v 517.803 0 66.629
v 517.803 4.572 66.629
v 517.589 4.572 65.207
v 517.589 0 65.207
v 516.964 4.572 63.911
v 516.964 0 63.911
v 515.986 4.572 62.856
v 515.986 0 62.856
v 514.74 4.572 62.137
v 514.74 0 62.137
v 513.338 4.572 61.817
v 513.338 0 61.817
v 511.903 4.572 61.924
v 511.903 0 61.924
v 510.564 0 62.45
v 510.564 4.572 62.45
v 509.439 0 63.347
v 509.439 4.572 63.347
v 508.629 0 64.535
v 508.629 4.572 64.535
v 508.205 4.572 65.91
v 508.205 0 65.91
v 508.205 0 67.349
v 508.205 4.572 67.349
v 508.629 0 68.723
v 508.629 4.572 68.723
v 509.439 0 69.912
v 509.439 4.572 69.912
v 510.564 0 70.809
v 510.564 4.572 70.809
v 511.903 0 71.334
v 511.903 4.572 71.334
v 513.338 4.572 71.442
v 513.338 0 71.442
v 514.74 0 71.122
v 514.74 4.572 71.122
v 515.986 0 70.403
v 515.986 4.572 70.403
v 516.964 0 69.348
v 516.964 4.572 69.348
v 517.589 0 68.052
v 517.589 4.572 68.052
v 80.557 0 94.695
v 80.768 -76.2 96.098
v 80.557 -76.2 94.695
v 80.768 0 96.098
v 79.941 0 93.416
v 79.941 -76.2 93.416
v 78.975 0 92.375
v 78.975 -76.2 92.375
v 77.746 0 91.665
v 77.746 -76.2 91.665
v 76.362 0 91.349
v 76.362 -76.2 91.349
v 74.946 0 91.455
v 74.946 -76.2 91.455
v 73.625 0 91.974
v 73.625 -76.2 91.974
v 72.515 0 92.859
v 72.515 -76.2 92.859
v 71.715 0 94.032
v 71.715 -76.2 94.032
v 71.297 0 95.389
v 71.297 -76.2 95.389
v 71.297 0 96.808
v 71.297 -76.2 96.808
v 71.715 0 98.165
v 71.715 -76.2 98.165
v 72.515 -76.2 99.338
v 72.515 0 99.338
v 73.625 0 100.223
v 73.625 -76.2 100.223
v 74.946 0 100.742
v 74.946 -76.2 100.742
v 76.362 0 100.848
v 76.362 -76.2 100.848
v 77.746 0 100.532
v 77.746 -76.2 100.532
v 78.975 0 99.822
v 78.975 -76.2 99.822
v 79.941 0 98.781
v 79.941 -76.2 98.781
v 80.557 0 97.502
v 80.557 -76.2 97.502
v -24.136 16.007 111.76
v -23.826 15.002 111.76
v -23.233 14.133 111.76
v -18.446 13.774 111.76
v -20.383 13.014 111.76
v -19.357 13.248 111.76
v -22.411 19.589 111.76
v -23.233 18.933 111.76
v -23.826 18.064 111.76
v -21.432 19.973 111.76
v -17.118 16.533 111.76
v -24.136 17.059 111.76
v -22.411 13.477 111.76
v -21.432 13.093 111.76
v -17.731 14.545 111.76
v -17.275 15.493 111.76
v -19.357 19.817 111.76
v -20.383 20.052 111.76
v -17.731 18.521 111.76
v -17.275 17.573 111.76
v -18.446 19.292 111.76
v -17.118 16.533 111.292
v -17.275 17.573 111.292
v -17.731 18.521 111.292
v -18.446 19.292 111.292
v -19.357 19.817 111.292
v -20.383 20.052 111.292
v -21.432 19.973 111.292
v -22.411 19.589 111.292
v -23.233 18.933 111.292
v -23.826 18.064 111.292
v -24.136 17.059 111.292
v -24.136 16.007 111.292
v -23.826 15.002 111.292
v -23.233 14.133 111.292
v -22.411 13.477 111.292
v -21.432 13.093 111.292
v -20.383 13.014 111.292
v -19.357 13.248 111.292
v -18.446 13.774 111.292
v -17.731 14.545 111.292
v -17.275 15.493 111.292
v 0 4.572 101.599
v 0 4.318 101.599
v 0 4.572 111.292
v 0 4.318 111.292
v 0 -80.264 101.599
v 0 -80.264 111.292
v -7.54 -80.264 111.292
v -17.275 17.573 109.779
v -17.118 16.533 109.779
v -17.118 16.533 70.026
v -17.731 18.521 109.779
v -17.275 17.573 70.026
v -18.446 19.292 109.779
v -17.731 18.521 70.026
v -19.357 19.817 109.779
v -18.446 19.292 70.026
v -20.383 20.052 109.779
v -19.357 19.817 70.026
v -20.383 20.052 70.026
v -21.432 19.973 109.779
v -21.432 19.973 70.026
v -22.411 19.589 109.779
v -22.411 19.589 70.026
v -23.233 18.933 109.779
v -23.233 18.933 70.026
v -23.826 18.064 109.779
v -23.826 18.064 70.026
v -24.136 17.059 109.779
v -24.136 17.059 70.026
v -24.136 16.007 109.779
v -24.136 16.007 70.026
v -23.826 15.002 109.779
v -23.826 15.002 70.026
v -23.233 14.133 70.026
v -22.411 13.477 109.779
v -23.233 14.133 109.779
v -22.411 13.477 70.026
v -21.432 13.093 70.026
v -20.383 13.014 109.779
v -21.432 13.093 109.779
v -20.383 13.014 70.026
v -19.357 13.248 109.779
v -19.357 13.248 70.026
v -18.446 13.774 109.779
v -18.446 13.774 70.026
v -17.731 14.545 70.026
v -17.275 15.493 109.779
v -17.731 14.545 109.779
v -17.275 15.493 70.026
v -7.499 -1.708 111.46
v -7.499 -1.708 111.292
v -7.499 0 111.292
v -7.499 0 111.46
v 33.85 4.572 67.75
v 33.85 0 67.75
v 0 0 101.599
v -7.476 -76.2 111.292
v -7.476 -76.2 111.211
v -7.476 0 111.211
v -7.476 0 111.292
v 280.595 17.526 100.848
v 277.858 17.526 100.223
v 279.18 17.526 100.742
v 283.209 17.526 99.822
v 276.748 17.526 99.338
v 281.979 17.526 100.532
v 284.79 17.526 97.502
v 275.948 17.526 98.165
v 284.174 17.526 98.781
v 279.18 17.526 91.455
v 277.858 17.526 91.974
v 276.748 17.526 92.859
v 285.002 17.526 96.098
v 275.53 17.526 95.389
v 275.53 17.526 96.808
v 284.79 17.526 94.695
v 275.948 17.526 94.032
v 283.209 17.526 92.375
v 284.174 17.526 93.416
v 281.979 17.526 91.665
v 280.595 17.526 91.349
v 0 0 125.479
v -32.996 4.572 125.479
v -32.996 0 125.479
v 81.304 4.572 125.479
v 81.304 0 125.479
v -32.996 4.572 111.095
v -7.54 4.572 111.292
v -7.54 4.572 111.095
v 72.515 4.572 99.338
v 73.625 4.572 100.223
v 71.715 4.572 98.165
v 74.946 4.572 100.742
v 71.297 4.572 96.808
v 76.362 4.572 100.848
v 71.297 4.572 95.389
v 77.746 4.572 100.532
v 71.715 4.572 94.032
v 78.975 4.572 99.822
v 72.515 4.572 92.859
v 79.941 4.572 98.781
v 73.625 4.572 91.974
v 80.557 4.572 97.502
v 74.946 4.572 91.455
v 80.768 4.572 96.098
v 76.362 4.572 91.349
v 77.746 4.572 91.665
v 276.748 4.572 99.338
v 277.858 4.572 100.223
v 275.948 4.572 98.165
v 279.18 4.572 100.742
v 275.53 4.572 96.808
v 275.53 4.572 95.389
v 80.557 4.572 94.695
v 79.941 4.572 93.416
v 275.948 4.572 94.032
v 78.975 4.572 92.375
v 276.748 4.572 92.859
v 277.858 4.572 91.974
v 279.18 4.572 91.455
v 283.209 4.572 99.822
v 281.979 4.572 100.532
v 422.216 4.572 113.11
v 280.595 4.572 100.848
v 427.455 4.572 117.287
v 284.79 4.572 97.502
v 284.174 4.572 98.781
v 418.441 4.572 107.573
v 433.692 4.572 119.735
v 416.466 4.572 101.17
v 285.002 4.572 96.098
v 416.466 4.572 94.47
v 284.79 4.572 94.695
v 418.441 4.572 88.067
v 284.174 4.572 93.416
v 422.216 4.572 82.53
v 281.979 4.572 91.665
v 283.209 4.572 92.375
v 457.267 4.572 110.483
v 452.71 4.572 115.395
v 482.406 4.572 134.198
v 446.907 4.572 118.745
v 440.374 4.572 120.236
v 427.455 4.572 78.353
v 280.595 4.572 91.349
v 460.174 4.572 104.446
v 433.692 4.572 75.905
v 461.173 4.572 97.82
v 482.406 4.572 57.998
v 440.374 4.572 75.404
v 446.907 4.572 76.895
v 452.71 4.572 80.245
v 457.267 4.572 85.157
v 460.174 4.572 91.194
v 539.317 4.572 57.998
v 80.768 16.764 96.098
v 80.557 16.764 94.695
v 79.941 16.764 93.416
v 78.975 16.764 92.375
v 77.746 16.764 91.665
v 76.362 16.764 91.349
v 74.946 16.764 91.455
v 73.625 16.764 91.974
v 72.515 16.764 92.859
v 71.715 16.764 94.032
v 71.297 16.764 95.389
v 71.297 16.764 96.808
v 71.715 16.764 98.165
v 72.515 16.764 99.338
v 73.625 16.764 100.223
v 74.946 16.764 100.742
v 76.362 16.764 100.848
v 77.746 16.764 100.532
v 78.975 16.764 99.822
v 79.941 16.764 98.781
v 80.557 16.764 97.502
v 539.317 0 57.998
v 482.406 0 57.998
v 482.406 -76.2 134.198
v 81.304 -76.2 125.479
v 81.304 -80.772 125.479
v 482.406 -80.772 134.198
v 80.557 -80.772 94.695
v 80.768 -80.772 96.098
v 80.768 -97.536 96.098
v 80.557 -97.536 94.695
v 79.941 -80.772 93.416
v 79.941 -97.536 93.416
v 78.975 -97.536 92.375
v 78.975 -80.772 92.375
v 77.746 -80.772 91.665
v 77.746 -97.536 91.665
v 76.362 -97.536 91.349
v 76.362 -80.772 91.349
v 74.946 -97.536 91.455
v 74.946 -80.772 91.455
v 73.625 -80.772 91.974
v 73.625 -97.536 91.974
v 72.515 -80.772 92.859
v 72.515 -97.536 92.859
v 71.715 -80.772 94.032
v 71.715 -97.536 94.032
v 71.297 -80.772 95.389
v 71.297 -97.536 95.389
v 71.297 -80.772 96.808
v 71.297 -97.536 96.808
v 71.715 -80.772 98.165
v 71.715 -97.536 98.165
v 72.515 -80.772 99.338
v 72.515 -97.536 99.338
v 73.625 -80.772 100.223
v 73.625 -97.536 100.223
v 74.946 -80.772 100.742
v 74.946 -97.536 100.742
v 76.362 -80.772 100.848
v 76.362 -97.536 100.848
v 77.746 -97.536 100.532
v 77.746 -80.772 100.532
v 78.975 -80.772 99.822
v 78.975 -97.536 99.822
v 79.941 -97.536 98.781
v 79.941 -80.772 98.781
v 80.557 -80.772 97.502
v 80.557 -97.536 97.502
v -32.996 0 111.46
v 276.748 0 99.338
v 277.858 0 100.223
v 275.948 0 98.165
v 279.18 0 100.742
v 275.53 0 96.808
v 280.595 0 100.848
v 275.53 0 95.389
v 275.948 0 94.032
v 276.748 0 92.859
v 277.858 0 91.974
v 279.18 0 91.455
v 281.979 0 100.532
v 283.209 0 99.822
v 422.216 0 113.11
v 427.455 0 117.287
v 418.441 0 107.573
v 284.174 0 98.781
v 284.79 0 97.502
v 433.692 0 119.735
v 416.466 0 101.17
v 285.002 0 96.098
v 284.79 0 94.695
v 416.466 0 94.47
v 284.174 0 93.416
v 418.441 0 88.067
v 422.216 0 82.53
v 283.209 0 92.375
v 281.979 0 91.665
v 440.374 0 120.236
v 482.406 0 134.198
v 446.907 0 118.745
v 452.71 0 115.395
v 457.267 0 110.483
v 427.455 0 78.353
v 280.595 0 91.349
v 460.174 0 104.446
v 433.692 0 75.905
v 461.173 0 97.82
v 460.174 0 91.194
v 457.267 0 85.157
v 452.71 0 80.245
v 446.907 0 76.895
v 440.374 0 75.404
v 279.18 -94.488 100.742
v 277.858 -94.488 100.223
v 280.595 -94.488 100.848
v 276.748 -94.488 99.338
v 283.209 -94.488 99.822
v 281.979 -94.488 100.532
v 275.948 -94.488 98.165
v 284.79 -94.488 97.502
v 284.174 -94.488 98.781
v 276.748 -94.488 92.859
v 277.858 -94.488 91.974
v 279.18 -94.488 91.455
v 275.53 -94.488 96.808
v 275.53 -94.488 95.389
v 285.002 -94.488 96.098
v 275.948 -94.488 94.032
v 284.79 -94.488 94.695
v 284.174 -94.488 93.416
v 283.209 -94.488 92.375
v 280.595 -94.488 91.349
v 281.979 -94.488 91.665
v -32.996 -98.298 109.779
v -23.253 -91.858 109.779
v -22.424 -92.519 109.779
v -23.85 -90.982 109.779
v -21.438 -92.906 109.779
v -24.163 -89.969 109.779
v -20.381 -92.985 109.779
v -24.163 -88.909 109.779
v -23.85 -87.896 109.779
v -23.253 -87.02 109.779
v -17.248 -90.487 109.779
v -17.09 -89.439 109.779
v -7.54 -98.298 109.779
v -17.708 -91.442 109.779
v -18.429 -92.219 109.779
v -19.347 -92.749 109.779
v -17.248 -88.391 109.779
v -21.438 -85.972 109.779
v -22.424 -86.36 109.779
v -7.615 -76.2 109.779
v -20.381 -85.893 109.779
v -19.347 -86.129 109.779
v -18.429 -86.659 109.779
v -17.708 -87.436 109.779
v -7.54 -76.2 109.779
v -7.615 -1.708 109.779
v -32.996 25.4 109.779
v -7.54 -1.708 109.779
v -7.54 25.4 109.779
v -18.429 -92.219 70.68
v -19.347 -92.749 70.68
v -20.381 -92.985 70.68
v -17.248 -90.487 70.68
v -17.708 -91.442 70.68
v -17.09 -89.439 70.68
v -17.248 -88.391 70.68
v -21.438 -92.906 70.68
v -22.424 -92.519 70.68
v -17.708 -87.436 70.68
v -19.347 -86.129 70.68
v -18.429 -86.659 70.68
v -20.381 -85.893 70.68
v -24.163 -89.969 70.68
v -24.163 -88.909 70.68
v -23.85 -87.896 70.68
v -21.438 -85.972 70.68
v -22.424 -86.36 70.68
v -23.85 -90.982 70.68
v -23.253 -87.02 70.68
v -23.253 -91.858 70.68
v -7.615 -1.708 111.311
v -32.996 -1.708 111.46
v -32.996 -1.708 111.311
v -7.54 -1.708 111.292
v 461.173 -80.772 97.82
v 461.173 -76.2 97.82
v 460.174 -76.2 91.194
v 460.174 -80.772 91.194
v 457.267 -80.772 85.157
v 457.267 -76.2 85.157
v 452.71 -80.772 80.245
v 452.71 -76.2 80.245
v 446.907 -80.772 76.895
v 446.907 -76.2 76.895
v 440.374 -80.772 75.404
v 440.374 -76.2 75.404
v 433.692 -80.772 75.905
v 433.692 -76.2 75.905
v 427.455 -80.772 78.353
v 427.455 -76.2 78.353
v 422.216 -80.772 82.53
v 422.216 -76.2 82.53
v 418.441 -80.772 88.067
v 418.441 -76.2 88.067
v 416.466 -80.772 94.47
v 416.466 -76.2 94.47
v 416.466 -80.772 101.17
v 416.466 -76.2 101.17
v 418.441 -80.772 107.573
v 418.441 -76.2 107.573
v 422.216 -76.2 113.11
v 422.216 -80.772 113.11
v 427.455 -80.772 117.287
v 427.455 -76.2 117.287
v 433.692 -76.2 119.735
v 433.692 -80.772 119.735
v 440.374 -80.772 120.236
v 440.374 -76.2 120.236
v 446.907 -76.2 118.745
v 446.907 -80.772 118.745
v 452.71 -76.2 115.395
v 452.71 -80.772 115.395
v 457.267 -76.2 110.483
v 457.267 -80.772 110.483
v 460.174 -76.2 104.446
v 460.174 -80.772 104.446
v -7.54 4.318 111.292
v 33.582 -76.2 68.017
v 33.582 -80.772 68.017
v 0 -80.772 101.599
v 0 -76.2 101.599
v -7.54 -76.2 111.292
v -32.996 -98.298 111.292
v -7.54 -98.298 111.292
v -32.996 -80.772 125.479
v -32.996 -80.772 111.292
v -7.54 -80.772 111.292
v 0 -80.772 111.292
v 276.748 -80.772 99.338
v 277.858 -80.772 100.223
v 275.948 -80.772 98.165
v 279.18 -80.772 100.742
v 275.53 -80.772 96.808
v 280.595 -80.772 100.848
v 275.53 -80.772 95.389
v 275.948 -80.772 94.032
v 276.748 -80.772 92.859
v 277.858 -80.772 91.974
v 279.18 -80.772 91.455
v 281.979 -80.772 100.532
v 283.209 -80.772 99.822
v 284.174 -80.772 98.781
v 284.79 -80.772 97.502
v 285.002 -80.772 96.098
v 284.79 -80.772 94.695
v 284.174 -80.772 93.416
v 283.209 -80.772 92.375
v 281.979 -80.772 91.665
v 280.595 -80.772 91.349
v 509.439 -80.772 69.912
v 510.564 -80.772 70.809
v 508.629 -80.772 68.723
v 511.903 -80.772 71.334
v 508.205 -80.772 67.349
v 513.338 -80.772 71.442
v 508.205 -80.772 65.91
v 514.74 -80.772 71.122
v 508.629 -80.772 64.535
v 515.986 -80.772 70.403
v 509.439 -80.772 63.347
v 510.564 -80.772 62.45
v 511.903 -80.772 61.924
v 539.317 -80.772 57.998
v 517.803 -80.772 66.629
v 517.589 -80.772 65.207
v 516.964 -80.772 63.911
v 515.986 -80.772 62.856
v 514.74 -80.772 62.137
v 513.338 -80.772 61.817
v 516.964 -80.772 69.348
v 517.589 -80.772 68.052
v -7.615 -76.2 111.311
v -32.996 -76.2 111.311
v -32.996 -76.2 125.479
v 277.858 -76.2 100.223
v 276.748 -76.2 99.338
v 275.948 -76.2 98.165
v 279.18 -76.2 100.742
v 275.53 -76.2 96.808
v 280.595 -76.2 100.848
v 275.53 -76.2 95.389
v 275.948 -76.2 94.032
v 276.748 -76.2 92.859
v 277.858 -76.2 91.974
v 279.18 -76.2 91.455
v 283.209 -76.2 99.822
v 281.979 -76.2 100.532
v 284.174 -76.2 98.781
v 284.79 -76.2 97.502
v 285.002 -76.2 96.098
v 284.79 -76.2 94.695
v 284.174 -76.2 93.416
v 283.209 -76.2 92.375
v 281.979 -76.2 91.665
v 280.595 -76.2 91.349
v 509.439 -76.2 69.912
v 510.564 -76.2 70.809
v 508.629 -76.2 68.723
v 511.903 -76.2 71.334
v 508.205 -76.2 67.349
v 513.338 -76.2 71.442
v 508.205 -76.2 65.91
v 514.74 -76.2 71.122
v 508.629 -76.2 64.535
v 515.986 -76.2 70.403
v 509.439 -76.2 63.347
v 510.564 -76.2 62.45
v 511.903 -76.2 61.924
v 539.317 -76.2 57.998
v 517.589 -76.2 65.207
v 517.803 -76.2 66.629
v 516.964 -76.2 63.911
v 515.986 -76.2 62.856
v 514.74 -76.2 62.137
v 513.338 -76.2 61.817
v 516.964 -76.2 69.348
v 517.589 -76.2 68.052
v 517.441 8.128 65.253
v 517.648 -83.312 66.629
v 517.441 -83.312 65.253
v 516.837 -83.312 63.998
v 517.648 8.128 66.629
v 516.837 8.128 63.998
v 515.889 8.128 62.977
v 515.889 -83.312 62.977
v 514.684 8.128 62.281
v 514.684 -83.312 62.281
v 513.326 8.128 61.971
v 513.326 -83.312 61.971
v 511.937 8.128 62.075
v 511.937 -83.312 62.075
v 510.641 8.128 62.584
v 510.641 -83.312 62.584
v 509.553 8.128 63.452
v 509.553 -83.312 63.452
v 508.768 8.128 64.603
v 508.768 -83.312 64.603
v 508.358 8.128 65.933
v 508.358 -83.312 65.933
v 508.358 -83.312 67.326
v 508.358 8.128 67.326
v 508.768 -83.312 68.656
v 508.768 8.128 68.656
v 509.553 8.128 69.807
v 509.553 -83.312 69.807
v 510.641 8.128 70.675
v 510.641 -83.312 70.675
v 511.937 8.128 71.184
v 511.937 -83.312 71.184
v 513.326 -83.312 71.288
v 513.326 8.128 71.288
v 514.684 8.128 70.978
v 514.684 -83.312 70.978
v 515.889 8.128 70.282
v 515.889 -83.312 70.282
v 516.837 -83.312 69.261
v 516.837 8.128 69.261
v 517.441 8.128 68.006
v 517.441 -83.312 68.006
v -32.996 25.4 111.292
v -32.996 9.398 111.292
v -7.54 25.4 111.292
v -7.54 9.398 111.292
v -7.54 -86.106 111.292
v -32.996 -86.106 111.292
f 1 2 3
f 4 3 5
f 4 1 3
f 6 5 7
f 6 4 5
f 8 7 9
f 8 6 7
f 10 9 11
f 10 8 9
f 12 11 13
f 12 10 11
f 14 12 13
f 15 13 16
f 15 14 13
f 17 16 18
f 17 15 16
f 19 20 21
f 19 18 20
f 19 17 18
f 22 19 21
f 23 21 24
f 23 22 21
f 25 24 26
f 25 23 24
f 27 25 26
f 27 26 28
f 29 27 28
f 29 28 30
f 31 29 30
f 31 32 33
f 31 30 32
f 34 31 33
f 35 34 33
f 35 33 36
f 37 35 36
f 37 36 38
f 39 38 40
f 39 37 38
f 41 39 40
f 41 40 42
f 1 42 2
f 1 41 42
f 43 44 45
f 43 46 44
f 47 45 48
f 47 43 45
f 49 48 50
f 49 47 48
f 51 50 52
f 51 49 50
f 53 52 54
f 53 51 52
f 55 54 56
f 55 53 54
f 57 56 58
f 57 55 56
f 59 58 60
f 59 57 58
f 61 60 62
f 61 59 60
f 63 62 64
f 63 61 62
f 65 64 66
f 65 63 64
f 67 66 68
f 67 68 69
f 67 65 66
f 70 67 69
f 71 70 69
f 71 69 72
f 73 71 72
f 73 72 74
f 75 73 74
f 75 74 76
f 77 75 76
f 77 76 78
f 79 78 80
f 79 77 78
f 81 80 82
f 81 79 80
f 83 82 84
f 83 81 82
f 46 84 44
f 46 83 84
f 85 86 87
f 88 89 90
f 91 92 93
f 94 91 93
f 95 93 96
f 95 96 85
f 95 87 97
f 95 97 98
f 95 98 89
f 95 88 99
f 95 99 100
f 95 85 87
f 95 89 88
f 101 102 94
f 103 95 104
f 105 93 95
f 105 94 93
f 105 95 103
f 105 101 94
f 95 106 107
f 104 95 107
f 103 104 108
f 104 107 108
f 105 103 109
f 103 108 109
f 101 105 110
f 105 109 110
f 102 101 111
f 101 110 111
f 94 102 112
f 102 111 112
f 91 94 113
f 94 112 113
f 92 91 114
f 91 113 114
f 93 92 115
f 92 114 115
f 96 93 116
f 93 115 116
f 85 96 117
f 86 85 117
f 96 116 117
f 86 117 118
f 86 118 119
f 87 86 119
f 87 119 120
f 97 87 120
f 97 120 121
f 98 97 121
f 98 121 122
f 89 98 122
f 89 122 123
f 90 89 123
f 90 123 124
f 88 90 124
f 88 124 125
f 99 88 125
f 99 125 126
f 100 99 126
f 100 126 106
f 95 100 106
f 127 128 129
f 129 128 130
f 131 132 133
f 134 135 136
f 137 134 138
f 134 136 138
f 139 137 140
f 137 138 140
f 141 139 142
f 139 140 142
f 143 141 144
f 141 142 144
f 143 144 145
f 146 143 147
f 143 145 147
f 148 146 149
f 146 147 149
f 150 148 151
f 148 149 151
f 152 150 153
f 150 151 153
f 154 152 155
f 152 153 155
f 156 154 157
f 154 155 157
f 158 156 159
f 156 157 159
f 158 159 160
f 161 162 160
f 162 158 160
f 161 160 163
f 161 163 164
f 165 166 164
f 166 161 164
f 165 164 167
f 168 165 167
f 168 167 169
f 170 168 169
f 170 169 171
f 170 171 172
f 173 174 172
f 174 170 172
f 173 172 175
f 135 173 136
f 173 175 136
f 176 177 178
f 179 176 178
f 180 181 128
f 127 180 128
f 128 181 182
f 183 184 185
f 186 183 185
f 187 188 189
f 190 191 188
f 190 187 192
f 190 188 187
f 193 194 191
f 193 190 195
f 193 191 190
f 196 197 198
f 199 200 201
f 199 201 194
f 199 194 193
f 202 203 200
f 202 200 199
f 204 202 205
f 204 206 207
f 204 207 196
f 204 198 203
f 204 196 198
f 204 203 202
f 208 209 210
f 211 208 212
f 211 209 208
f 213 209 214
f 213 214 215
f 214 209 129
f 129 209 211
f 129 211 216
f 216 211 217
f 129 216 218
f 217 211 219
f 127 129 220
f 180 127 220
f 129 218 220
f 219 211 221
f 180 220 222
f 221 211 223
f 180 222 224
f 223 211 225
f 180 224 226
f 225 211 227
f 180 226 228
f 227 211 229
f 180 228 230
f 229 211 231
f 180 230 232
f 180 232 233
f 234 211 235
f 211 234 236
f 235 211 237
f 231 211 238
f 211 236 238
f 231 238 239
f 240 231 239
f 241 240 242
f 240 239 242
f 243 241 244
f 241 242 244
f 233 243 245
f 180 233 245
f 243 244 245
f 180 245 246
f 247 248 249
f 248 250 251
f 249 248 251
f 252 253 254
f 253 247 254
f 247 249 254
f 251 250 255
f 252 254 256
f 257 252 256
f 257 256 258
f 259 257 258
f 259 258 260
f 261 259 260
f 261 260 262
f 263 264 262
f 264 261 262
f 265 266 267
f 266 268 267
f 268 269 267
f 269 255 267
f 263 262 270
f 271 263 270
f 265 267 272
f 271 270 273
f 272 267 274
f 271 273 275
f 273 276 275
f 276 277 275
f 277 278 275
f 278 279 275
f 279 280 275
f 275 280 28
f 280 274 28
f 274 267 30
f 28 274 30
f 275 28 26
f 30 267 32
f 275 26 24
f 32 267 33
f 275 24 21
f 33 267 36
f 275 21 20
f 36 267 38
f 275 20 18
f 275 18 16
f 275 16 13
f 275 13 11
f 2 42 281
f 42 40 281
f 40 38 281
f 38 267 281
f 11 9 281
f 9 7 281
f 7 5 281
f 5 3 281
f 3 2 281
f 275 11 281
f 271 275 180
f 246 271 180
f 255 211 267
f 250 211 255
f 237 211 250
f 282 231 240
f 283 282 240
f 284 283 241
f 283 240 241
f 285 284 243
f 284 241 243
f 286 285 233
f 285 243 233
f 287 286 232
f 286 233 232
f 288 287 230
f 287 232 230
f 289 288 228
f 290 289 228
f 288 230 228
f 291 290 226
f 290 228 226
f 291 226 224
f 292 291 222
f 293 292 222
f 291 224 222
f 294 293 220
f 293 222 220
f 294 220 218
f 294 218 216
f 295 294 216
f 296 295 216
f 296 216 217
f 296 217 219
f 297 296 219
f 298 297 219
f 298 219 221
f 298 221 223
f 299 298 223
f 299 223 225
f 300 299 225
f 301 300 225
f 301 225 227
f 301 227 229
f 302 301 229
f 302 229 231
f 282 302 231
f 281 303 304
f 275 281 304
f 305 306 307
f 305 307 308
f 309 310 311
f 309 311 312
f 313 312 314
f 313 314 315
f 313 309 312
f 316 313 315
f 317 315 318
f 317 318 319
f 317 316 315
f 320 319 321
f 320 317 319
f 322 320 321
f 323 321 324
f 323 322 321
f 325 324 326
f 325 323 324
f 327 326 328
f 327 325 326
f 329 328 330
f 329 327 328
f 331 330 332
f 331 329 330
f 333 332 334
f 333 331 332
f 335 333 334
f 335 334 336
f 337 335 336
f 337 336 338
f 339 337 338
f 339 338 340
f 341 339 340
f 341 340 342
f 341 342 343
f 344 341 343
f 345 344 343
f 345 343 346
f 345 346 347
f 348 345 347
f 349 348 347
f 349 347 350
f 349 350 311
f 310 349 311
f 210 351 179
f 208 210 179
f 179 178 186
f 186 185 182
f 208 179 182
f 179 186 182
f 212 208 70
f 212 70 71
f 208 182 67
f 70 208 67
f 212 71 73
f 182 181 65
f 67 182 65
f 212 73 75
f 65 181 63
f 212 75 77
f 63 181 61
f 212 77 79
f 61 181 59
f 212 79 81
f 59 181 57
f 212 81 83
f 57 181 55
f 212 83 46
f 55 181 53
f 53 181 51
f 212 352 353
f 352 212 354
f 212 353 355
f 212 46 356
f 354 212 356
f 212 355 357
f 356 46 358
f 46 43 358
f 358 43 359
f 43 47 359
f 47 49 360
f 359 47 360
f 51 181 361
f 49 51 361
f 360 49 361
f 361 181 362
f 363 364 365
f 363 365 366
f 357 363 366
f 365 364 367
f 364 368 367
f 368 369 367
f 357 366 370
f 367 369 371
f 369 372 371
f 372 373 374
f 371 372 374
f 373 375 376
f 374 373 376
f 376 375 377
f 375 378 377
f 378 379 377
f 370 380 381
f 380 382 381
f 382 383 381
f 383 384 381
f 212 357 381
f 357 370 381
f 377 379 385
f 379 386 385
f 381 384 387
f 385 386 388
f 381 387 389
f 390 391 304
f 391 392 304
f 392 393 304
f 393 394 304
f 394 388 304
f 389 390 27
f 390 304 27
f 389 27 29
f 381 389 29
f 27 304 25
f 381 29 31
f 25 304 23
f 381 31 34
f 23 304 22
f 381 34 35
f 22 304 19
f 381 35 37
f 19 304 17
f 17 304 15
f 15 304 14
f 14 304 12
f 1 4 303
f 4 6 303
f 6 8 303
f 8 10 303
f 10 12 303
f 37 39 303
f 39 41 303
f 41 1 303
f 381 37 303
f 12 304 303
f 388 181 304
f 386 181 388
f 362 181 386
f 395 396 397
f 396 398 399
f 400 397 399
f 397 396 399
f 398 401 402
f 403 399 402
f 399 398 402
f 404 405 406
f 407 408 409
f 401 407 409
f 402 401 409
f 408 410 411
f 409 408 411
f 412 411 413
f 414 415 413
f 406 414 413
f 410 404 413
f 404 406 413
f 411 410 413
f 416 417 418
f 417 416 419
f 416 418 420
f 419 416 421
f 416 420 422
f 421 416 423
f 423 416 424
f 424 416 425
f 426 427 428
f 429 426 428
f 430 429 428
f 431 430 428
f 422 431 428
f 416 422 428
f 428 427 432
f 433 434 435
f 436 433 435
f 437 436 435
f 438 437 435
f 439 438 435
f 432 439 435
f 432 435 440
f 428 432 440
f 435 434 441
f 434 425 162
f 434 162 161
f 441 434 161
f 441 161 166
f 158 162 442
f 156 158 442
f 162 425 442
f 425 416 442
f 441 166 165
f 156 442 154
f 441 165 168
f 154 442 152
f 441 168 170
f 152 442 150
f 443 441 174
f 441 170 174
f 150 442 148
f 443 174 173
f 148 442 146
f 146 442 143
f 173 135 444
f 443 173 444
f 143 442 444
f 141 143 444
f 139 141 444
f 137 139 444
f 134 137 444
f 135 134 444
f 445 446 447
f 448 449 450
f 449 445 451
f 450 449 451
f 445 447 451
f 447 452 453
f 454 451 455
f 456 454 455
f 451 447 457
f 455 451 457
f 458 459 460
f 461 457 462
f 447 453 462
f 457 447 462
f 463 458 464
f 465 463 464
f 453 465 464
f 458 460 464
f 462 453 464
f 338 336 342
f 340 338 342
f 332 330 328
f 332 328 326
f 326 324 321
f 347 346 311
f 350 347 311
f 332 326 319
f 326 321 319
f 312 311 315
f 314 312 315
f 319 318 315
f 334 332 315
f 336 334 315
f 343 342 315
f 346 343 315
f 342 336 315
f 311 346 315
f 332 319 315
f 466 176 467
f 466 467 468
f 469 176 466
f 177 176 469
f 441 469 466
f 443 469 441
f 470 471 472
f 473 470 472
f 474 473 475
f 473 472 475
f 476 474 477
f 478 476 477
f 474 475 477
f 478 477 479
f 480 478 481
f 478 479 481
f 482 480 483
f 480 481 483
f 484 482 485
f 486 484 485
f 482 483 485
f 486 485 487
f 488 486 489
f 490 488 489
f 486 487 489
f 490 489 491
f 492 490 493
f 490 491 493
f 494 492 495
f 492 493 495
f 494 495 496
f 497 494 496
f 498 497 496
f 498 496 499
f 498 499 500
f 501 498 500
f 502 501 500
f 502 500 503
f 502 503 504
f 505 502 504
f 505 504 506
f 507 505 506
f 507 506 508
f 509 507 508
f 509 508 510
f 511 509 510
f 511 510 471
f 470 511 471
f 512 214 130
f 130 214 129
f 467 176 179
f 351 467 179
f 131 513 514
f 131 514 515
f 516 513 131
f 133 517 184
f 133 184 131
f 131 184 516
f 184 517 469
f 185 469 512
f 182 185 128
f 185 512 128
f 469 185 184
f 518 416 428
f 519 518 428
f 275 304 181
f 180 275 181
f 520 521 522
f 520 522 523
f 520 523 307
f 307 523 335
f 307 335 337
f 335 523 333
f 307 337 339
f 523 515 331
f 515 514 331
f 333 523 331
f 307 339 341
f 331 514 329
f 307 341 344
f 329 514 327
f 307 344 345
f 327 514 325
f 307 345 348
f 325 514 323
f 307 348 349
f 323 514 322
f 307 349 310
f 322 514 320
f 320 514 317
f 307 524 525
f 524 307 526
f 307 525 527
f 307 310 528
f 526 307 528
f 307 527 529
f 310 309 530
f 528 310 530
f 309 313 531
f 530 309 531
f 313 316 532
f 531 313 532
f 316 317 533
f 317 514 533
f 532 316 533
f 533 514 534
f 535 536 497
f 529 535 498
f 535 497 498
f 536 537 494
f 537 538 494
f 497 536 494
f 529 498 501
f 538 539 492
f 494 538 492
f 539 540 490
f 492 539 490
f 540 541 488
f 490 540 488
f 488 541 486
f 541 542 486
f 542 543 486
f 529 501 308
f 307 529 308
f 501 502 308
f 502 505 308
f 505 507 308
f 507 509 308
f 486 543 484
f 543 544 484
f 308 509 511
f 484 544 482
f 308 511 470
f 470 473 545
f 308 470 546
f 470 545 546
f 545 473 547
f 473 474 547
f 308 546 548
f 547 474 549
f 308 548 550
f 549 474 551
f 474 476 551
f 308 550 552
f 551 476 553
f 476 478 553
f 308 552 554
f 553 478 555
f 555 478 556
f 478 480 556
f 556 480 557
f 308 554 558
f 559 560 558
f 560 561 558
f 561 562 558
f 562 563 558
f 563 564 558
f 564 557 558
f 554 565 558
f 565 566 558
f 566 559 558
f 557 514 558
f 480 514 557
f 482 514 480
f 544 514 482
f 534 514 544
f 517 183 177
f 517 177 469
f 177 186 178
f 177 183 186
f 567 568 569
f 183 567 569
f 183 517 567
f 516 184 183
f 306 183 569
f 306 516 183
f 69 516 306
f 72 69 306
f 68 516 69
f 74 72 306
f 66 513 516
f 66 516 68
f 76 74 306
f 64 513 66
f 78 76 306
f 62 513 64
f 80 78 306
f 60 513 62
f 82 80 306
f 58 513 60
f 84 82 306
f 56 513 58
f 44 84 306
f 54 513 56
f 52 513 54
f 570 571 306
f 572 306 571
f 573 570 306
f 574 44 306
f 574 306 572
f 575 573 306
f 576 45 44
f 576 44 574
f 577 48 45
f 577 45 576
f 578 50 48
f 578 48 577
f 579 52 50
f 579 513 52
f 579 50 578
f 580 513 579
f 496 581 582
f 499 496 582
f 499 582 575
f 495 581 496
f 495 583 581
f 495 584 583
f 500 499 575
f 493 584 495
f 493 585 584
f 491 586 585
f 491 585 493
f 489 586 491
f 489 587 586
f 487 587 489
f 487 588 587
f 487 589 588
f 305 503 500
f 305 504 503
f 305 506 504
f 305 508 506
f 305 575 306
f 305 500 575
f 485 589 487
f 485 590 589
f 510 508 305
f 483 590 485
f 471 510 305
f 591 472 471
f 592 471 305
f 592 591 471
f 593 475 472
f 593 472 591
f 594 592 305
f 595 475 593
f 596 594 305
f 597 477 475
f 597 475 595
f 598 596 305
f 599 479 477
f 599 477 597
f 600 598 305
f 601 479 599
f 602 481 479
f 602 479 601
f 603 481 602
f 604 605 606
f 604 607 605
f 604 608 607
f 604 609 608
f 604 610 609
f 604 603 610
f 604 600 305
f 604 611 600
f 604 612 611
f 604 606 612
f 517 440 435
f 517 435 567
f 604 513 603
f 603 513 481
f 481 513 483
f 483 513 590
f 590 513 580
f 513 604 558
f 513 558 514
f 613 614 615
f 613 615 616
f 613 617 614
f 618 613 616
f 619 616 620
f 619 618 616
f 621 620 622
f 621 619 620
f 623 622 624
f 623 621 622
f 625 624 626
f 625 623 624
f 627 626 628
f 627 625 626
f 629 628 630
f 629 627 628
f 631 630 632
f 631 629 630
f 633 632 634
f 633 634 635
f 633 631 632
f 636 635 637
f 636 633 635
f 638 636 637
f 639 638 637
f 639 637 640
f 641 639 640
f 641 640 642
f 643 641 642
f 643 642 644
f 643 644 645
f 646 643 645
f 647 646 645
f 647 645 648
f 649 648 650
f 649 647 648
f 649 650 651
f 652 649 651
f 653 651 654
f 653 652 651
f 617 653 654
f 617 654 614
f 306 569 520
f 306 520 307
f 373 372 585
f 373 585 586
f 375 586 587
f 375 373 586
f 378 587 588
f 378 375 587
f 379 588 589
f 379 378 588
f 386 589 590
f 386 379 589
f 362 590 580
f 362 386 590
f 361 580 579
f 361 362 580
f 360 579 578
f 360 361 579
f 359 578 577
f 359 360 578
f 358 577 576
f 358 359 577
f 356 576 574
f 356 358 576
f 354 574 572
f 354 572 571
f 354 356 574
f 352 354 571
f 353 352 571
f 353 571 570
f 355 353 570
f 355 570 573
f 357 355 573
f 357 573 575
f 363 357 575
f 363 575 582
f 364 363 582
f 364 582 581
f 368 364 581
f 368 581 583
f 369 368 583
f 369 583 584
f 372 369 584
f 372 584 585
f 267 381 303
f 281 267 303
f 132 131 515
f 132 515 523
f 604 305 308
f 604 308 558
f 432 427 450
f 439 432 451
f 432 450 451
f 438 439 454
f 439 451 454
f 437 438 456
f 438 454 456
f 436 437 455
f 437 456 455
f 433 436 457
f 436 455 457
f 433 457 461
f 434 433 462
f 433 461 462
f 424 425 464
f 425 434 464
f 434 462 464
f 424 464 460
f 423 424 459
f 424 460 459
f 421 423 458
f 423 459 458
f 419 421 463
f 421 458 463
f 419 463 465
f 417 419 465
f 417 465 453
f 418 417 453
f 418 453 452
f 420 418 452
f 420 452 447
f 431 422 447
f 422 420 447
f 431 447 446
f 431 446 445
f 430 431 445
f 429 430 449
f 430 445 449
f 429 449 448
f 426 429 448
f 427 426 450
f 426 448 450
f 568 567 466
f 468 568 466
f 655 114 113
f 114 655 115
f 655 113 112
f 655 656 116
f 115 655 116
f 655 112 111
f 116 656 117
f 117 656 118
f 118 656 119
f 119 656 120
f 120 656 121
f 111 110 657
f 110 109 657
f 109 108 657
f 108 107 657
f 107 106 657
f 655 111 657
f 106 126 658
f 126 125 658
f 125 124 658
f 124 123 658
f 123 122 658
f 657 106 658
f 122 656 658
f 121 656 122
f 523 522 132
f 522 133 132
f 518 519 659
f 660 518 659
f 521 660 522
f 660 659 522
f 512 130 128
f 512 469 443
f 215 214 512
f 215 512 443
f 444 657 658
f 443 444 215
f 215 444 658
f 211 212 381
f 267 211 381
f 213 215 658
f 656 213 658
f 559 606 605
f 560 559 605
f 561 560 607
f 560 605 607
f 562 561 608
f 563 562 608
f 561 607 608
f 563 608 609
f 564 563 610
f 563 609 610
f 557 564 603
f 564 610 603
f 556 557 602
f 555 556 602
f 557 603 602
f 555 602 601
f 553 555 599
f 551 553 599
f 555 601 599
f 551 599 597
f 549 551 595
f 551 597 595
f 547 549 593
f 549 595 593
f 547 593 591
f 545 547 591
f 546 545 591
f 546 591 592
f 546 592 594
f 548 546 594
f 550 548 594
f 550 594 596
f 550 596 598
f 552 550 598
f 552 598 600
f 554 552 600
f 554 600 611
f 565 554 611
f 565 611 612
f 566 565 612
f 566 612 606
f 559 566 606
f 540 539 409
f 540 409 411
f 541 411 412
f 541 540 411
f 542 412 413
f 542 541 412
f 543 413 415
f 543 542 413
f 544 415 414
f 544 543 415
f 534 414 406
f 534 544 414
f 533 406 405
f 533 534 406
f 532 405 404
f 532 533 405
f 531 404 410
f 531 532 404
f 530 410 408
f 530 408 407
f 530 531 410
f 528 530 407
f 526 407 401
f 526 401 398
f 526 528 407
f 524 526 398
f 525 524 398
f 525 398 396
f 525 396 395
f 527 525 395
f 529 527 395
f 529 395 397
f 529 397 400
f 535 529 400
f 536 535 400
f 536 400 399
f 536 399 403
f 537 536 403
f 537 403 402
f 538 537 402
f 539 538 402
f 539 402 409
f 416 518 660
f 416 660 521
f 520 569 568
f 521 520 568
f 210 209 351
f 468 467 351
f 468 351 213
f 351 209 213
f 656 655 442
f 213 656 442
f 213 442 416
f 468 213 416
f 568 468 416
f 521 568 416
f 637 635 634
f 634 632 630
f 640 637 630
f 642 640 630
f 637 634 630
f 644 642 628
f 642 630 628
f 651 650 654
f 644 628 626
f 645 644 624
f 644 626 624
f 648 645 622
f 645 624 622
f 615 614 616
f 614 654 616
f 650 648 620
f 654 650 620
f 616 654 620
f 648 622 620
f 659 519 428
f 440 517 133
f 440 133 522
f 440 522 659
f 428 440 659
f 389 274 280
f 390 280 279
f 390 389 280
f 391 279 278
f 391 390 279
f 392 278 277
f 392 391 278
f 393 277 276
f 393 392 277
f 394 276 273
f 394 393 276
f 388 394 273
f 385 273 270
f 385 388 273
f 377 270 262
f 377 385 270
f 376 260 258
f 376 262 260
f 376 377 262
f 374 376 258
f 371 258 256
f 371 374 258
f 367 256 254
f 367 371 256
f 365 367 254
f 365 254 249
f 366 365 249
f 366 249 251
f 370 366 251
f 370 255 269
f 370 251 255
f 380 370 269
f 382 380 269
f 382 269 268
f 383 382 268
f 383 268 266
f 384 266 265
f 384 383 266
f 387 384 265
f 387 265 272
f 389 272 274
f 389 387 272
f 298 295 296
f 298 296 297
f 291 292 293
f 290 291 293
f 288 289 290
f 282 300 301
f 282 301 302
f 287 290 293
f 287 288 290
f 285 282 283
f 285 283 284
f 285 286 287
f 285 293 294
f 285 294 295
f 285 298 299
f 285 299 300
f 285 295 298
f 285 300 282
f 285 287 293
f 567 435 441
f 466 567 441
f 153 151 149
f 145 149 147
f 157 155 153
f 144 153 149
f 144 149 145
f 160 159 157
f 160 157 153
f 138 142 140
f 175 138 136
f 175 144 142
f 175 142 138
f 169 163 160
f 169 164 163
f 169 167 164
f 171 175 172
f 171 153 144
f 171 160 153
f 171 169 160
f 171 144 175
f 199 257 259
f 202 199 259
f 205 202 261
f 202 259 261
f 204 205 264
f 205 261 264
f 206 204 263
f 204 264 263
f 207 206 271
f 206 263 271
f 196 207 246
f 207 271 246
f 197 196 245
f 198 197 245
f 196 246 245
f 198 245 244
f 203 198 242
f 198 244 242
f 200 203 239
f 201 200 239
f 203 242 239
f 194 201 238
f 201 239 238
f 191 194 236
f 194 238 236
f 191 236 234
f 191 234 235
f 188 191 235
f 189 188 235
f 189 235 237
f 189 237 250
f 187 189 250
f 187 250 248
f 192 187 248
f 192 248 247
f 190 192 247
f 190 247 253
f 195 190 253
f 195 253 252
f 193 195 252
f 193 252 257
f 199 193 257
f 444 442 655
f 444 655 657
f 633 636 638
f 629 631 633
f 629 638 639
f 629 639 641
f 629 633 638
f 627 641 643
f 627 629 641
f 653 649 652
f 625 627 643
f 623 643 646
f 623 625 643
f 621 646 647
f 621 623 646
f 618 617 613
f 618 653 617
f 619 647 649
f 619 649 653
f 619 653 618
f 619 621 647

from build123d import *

# Parameters (mm, degrees)
SALIENTE_EXTRUIR2_DEPTH       = 4.572
CROQUIS4_R                    = 4.7625
CORTAR_EXTRUIR2_DEPTH         = 152.654
CORTAR_EXTRUIR2_DEPTH_BACK    = 98.552
CROQUIS5_R                    = 7.9375
CORTAR_EXTRUIR5_DEPTH         = 47.498
CORTAR_EXTRUIR5_DEPTH_BACK    = 59.182
CROQUIS6_R                    = 4.7625
SALIENTE_EXTRUIR4_DEPTH       = 17.526
SALIENTE_EXTRUIR4_DEPTH_BACK  = 94.488
CROQUIS7_R                    = 4.7625
SALIENTE_EXTRUIR5_DEPTH       = 16.002
SALIENTE_EXTRUIR5_DEPTH_BACK  = 97.536
CROQUIS10_R                   = 7.9375
SALIENTE_EXTRUIR6_DEPTH       = 4.572
CROQUIS11_R                   = 22.479
CORTAR_EXTRUIR6_DEPTH         = 97.282
CORTAR_EXTRUIR6_DEPTH_BACK    = 123.444
CROQUIS12_R                   = 4.826
CORTAR_EXTRUIR7_DEPTH         = 113.792
CORTAR_EXTRUIR7_DEPTH_BACK    = 187.96
CROQUIS13_R                   = 4.671315892
SALIENTE_EXTRUIR8_DEPTH       = 3.556
SALIENTE_EXTRUIR8_DEPTH_BACK  = 87.884
CORTAR_EXTRUIR8_DEPTH         = 84.074
CORTAR_EXTRUIR8_DEPTH_BACK    = 142.748
CROQUIS15_W                   = 114.3
CROQUIS15_H                   = 14.18647629
SALIENTE_EXTRUIR13_DEPTH      = 9.398
SALIENTE_EXTRUIR13_DEPTH_BACK = 86.106
CROQUIS17_W                   = 25.456436791
CROQUIS17_H                   = 1.513590227
SALIENTE_EXTRUIR14_DEPTH      = 25.4
SALIENTE_EXTRUIR14_DEPTH_BACK = 98.298
CROQUIS18_W                   = 13.736168234
CROQUIS18_H                   = 76.2
CORTAR_EXTRUIR9_DEPTH         = 127.508
CROQUIS19_W                   = 14.167732796
CROQUIS19_H                   = 72.287064097
CORTAR_EXTRUIR12_DEPTH        = 127.508
CROQUIS20_W                   = 71.243454513
CROQUIS20_H                   = 66.240283729
CORTAR_EXTRUIR13_DEPTH        = 289.306
CORTAR_EXTRUIR13_DEPTH_BACK   = 150.368
CORTAR_EXTRUIR14_DEPTH        = 662.432
CORTAR_EXTRUIR14_DEPTH_BACK   = 12.7
CORTAR_EXTRUIR15_DEPTH        = 397.51
CROQUIS23_R                   = 4.7625
SALIENTE_EXTRUIR15_DEPTH      = 16.764
SALIENTE_EXTRUIR15_DEPTH_BACK = 95.504
CORTAR_EXTRUIR17_DEPTH        = 83.566
CORTAR_EXTRUIR17_DEPTH_BACK   = 37.846
CROQUIS25_W                   = 14.18647629
CROQUIS25_H                   = 5.334
CORTAR_EXTRUIR18_DEPTH        = 88.138
CORTAR_EXTRUIR18_DEPTH_BACK   = 41.402
CROQUIS26_W                   = 14.019306629
CROQUIS26_H                   = 1.708052777
CORTAR_EXTRUIR19_DEPTH        = 41.402
CORTAR_EXTRUIR19_DEPTH_BACK   = 67.31
CROQUIS27_W                   = 14.167732796
CROQUIS27_H                   = 2.204883126
CORTAR_EXTRUIR20_DEPTH        = 48.26
CORTAR_EXTRUIR20_DEPTH_BACK   = 71.628
CROQUIS28_W                   = 7.614539368
CROQUIS28_H                   = 74.491947223
CORTAR_EXTRUIR21_DEPTH        = 254
CROQUIS29_W                   = 7.498830198
CROQUIS29_H                   = 1.708052777
CORTAR_EXTRUIR22_DEPTH        = 340.106
SALIENTE_EXTRUIR19_DEPTH      = 4.318
SALIENTE_EXTRUIR19_DEPTH_BACK = 80.264
CROQUIS32_W                   = 7.476401903
CROQUIS32_H                   = 76.2
CORTAR_EXTRUIR24_DEPTH        = 209.042
CROQUIS33_R                   = 3.528685289
SALIENTE_EXTRUIR20_DEPTH      = 111.76
CROQUIS34_W                   = 7.057370577
CROQUIS34_H                   = 70.026056614
CORTAR_EXTRUIR25_DEPTH        = 200.406
CROQUIS35_R                   = 3.556
SALIENTE_EXTRUIR21_DEPTH      = 110.998
SALIENTE_EXTRUIR21_DEPTH_BACK = 5.08
CROQUIS36_W                   = 75.760333747
CROQUIS36_H                   = 7.112
CORTAR_EXTRUIR26_DEPTH        = 55.626
CORTAR_EXTRUIR26_DEPTH_BACK   = 67.818


with BuildPart() as part:
    # Croquis1 → Saliente-Extruir2 (new body)
    with BuildSketch(Plane(origin=(0, 0, 0), x_dir=(1, 0, 0), z_dir=(0, 1, 0))):
        Polygon((-101.794045487, -70.698494166), (-101.794045487, -121.498494166), (482.405954513, -134.198494166), (539.316670094, -57.998494166), (482.405954513, -57.998494166), align=None)
    extrude(amount=SALIENTE_EXTRUIR2_DEPTH)

    # Croquis4 → Cortar-Extruir2 (cut, two sides)
    with BuildSketch(Plane(origin=(0, 0, 0), x_dir=(1, 0, 0), z_dir=(0, 1, 0))) as cortar_extruir2_sk:
        with Locations((76.005954513, -96.098494166)):
            Circle(CROQUIS4_R)
        with Locations((280.239325042, -96.098494166)):
            Circle(CROQUIS4_R)
    extrude(amount=CORTAR_EXTRUIR2_DEPTH, mode=Mode.SUBTRACT)
    extrude(cortar_extruir2_sk.sketch, amount=-CORTAR_EXTRUIR2_DEPTH_BACK, mode=Mode.SUBTRACT)

    # Croquis5 → Cortar-Extruir5 (cut, two sides)
    with BuildSketch(Plane(origin=(0, 0, 0), x_dir=(1, 0, 0), z_dir=(0, 1, 0))) as cortar_extruir5_sk:
        with Locations((438.694154646, -97.820081973)):
            Circle(CROQUIS5_R)
    extrude(amount=CORTAR_EXTRUIR5_DEPTH, mode=Mode.SUBTRACT)
    extrude(cortar_extruir5_sk.sketch, amount=-CORTAR_EXTRUIR5_DEPTH_BACK, mode=Mode.SUBTRACT)

    # Croquis6 → Saliente-Extruir4 (add, two sides)
    with BuildSketch(Plane(origin=(0, 0, 0), x_dir=(1, 0, 0), z_dir=(0, 1, 0))) as saliente_extruir4_sk:
        with Locations((280.239325042, -96.098494166)):
            Circle(CROQUIS6_R)
    extrude(amount=SALIENTE_EXTRUIR4_DEPTH)
    extrude(saliente_extruir4_sk.sketch, amount=-SALIENTE_EXTRUIR4_DEPTH_BACK)

    # Croquis7 → Saliente-Extruir5 (add, two sides)
    with BuildSketch(Plane(origin=(0, 0, 0), x_dir=(1, 0, 0), z_dir=(0, 1, 0))) as saliente_extruir5_sk:
        with Locations((76.005954513, -96.098494166)):
            Circle(CROQUIS7_R)
    extrude(amount=SALIENTE_EXTRUIR5_DEPTH)
    extrude(saliente_extruir5_sk.sketch, amount=-SALIENTE_EXTRUIR5_DEPTH_BACK)

    # Croquis10 → Saliente-Extruir6 (add)
    with BuildSketch(Plane(origin=(0, -76.2, 0), x_dir=(-1, 0, 0), z_dir=(0, -1, 0))):
        Polygon((-539.316670094, -57.998494166), (101.794045487, -70.698494166), (101.794045487, -121.498494166), (-482.405954513, -134.198494166), align=None)
        with Locations((-438.694154646, -97.820081973)):
            Circle(CROQUIS10_R, mode=Mode.SUBTRACT)
    extrude(amount=SALIENTE_EXTRUIR6_DEPTH)

    # Croquis11 → Cortar-Extruir6 (cut, two sides)
    with BuildSketch(Plane(origin=(0, 0, 0), x_dir=(1, 0, 0), z_dir=(0, 1, 0))) as cortar_extruir6_sk:
        with Locations((438.694154646, -97.820081973)):
            Circle(CROQUIS11_R)
    extrude(amount=CORTAR_EXTRUIR6_DEPTH, mode=Mode.SUBTRACT)
    extrude(cortar_extruir6_sk.sketch, amount=-CORTAR_EXTRUIR6_DEPTH_BACK, mode=Mode.SUBTRACT)

    # Croquis12 → Cortar-Extruir7 (cut, two sides)
    with BuildSketch(Plane(origin=(0, 0, 0), x_dir=(1, 0, 0), z_dir=(0, 1, 0))) as cortar_extruir7_sk:
        with Locations((512.976925935, -66.629402009)):
            Circle(CROQUIS12_R)
    extrude(amount=CORTAR_EXTRUIR7_DEPTH, mode=Mode.SUBTRACT)
    extrude(cortar_extruir7_sk.sketch, amount=-CORTAR_EXTRUIR7_DEPTH_BACK, mode=Mode.SUBTRACT)

    # Croquis14 → Cortar-Extruir8 (cut, two sides)
    with BuildSketch(Plane(origin=(0, 0, 0), x_dir=(1, 0, 0), z_dir=(0, 1, 0))) as cortar_extruir8_sk:
        Polygon((33.849548038, -67.749720393), (0, -101.599268431), (0, -123.711408198), (-101.794045487, -121.498494166), (-101.794045487, -70.698494166), align=None)
    extrude(amount=CORTAR_EXTRUIR8_DEPTH, mode=Mode.SUBTRACT)
    extrude(cortar_extruir8_sk.sketch, amount=-CORTAR_EXTRUIR8_DEPTH_BACK, mode=Mode.SUBTRACT)

    # Croquis15 → Saliente-Extruir13 (add, two sides)
    with BuildSketch(Plane(origin=(0, 0, 0), x_dir=(1, 0, 0), z_dir=(0, 1, 0))) as saliente_extruir13_sk:
        with Locations((24.153600026, -118.385639619)):
            Rectangle(CROQUIS15_W, CROQUIS15_H)
    extrude(amount=SALIENTE_EXTRUIR13_DEPTH)
    extrude(saliente_extruir13_sk.sketch, amount=-SALIENTE_EXTRUIR13_DEPTH_BACK)

    # Croquis17 → Saliente-Extruir14 (add, two sides)
    with BuildSketch(Plane(origin=(0, 0, 0), x_dir=(1, 0, 0), z_dir=(0, 1, 0))) as saliente_extruir14_sk:
        with Locations((-20.268181578, -110.53560636)):
            Rectangle(CROQUIS17_W, CROQUIS17_H)
    extrude(amount=SALIENTE_EXTRUIR14_DEPTH)
    extrude(saliente_extruir14_sk.sketch, amount=-SALIENTE_EXTRUIR14_DEPTH_BACK)

    # Croquis18 → Cortar-Extruir9 (cut)
    with BuildSketch(Plane(origin=(0, 0, 0), x_dir=(0, 0, -1), z_dir=(1, 0, 0))):
        with Locations((-118.610793647, -38.1)):
            Rectangle(CROQUIS18_W, CROQUIS18_H)
    extrude(amount=CORTAR_EXTRUIR9_DEPTH, mode=Mode.SUBTRACT)

    # Croquis19 → Cortar-Extruir12 (cut)
    with BuildSketch(Plane(origin=(0, 0, 0), x_dir=(0, 0, -1), z_dir=(1, 0, 0))):
        with Locations((-118.395011366, -37.851584826)):
            Rectangle(CROQUIS19_W, CROQUIS19_H)
    extrude(amount=-CORTAR_EXTRUIR12_DEPTH, mode=Mode.SUBTRACT)

    # Croquis20 → Cortar-Extruir13 (cut, two sides)
    with BuildSketch(Plane.XY.offset(111.74270953)) as cortar_extruir13_sk:
        with Locations((35.621727257, -38.064616677)):
            Rectangle(CROQUIS20_W, CROQUIS20_H)
    extrude(amount=CORTAR_EXTRUIR13_DEPTH, mode=Mode.SUBTRACT)
    extrude(cortar_extruir13_sk.sketch, amount=-CORTAR_EXTRUIR13_DEPTH_BACK, mode=Mode.SUBTRACT)

    # Croquis21 → Cortar-Extruir14 (cut, two sides)
    with BuildSketch(Plane.XY) as cortar_extruir14_sk:
        Polygon((71.243454513, -4.944474812), (71.243454513, -71.184758541), (81.303600026, -76.2), (81.303600026, 0), (0, 0), (0, -4.944474812), align=None)
    extrude(amount=CORTAR_EXTRUIR14_DEPTH, mode=Mode.SUBTRACT)
    extrude(cortar_extruir14_sk.sketch, amount=-CORTAR_EXTRUIR14_DEPTH_BACK, mode=Mode.SUBTRACT)

    # Croquis22 → Cortar-Extruir15 (cut)
    with BuildSketch(Plane.XY):
        Polygon((71.243454513, -71.184758541), (0, -71.184758541), (0, -76.2), (81.544591258, -76.2), align=None)
    extrude(amount=CORTAR_EXTRUIR15_DEPTH, mode=Mode.SUBTRACT)

    # Croquis23 → Saliente-Extruir15 (add, two sides)
    with BuildSketch(Plane(origin=(0, 0, 0), x_dir=(1, 0, 0), z_dir=(0, 1, 0))) as saliente_extruir15_sk:
        with Locations((76.005954513, -96.098494166)):
            Circle(CROQUIS23_R)
    extrude(amount=SALIENTE_EXTRUIR15_DEPTH)
    extrude(saliente_extruir15_sk.sketch, amount=-SALIENTE_EXTRUIR15_DEPTH_BACK)

    # Croquis24 → Cortar-Extruir17 (cut, two sides)
    with BuildSketch(Plane(origin=(0, 0, 0), x_dir=(0, 0, -1), z_dir=(1, 0, 0))) as cortar_extruir17_sk:
        Polygon((-125.478877764, 4.572), (-111.095362687, 4.572), (-111.292401474, 9.398), (-125.478877764, 9.398), align=None)
    extrude(amount=CORTAR_EXTRUIR17_DEPTH, mode=Mode.SUBTRACT)
    extrude(cortar_extruir17_sk.sketch, amount=-CORTAR_EXTRUIR17_DEPTH_BACK, mode=Mode.SUBTRACT)

    # Croquis25 → Cortar-Extruir18 (cut, two sides)
    with BuildSketch(Plane(origin=(0, 0, 0), x_dir=(0, 0, -1), z_dir=(1, 0, 0))) as cortar_extruir18_sk:
        with Locations((-118.385639619, -83.439)):
            Rectangle(CROQUIS25_W, CROQUIS25_H)
    extrude(amount=CORTAR_EXTRUIR18_DEPTH, mode=Mode.SUBTRACT)
    extrude(cortar_extruir18_sk.sketch, amount=-CORTAR_EXTRUIR18_DEPTH_BACK, mode=Mode.SUBTRACT)

    # Croquis26 → Cortar-Extruir19 (cut, two sides)
    with BuildSketch(Plane(origin=(0, 0, 0), x_dir=(0, 0, -1), z_dir=(1, 0, 0))) as cortar_extruir19_sk:
        with Locations((-118.46922445, -0.854026389)):
            Rectangle(CROQUIS26_W, CROQUIS26_H)
    extrude(amount=CORTAR_EXTRUIR19_DEPTH, mode=Mode.SUBTRACT)
    extrude(cortar_extruir19_sk.sketch, amount=-CORTAR_EXTRUIR19_DEPTH_BACK, mode=Mode.SUBTRACT)

    # Croquis27 → Cortar-Extruir20 (cut, two sides)
    with BuildSketch(Plane(origin=(0, 0, 0), x_dir=(0, 0, -1), z_dir=(1, 0, 0))) as cortar_extruir20_sk:
        with Locations((-118.395011366, -75.097558437)):
            Rectangle(CROQUIS27_W, CROQUIS27_H)
    extrude(amount=CORTAR_EXTRUIR20_DEPTH, mode=Mode.SUBTRACT)
    extrude(cortar_extruir20_sk.sketch, amount=-CORTAR_EXTRUIR20_DEPTH_BACK, mode=Mode.SUBTRACT)

    # Croquis28 → Cortar-Extruir21 (cut)
    with BuildSketch(Plane.XY):
        with Locations((-3.807269684, -38.954026389)):
            Rectangle(CROQUIS28_W, CROQUIS28_H)
    extrude(amount=CORTAR_EXTRUIR21_DEPTH, mode=Mode.SUBTRACT)

    # Croquis29 → Cortar-Extruir22 (cut)
    with BuildSketch(Plane.XY):
        with Locations((-3.749415099, -0.854026389)):
            Rectangle(CROQUIS29_W, CROQUIS29_H)
    extrude(amount=CORTAR_EXTRUIR22_DEPTH, mode=Mode.SUBTRACT)

    # Croquis30 → Saliente-Extruir19 (add, two sides)
    with BuildSketch(Plane(origin=(0, 0, 0), x_dir=(1, 0, 0), z_dir=(0, 1, 0))) as saliente_extruir19_sk:
        Polygon((-7.539963183, -111.292401474), (0, -101.599268431), (0, -111.292401474), align=None)
    extrude(amount=SALIENTE_EXTRUIR19_DEPTH)
    extrude(saliente_extruir19_sk.sketch, amount=-SALIENTE_EXTRUIR19_DEPTH_BACK)

    # Croquis32 → Cortar-Extruir24 (cut)
    with BuildSketch(Plane.XY):
        with Locations((-3.738200952, -38.1)):
            Rectangle(CROQUIS32_W, CROQUIS32_H)
    extrude(amount=CORTAR_EXTRUIR24_DEPTH, mode=Mode.SUBTRACT)

    # Croquis33 → Saliente-Extruir20 (add)
    with BuildSketch(Plane.XY):
        with Locations((-20.646499343, 16.53272161)):
            Circle(CROQUIS33_R)
    extrude(amount=SALIENTE_EXTRUIR20_DEPTH)

    # Croquis34 → Cortar-Extruir25 (cut)
    with BuildSketch(Plane(origin=(0, 0, 0), x_dir=(1, 0, 0), z_dir=(0, 1, 0))):
        with Locations((-20.646499343, -35.013028307)):
            Rectangle(CROQUIS34_W, CROQUIS34_H)
    extrude(amount=CORTAR_EXTRUIR25_DEPTH, mode=Mode.SUBTRACT)

    # Croquis35 → Saliente-Extruir21 (add, two sides)
    with BuildSketch(Plane.XY) as saliente_extruir21_sk:
        with Locations((-20.646499343, -89.439131113)):
            Circle(CROQUIS35_R)
    extrude(amount=SALIENTE_EXTRUIR21_DEPTH)
    extrude(saliente_extruir21_sk.sketch, amount=-SALIENTE_EXTRUIR21_DEPTH_BACK)

    # Croquis36 → Cortar-Extruir26 (cut, two sides)
    with BuildSketch(Plane.ZY.offset(32.996399974)) as cortar_extruir26_sk:
        with Locations((32.800166874, -89.439131113)):
            Rectangle(CROQUIS36_W, CROQUIS36_H)
    extrude(amount=CORTAR_EXTRUIR26_DEPTH, mode=Mode.SUBTRACT)
    extrude(cortar_extruir26_sk.sketch, amount=-CORTAR_EXTRUIR26_DEPTH_BACK, mode=Mode.SUBTRACT)


with BuildPart() as body_2:
    # Croquis13 → Saliente-Extruir8 (new body, two sides)
    with BuildSketch(Plane(origin=(0, 4.572, 0), x_dir=(1, 0, 0), z_dir=(0, 1, 0))) as saliente_extruir8_sk:
        with Locations((512.976925935, -66.629402009)):
            Circle(CROQUIS13_R)
    extrude(amount=SALIENTE_EXTRUIR8_DEPTH)
    extrude(saliente_extruir8_sk.sketch, amount=-SALIENTE_EXTRUIR8_DEPTH_BACK)


solid = Compound([part.part, body_2.part])
